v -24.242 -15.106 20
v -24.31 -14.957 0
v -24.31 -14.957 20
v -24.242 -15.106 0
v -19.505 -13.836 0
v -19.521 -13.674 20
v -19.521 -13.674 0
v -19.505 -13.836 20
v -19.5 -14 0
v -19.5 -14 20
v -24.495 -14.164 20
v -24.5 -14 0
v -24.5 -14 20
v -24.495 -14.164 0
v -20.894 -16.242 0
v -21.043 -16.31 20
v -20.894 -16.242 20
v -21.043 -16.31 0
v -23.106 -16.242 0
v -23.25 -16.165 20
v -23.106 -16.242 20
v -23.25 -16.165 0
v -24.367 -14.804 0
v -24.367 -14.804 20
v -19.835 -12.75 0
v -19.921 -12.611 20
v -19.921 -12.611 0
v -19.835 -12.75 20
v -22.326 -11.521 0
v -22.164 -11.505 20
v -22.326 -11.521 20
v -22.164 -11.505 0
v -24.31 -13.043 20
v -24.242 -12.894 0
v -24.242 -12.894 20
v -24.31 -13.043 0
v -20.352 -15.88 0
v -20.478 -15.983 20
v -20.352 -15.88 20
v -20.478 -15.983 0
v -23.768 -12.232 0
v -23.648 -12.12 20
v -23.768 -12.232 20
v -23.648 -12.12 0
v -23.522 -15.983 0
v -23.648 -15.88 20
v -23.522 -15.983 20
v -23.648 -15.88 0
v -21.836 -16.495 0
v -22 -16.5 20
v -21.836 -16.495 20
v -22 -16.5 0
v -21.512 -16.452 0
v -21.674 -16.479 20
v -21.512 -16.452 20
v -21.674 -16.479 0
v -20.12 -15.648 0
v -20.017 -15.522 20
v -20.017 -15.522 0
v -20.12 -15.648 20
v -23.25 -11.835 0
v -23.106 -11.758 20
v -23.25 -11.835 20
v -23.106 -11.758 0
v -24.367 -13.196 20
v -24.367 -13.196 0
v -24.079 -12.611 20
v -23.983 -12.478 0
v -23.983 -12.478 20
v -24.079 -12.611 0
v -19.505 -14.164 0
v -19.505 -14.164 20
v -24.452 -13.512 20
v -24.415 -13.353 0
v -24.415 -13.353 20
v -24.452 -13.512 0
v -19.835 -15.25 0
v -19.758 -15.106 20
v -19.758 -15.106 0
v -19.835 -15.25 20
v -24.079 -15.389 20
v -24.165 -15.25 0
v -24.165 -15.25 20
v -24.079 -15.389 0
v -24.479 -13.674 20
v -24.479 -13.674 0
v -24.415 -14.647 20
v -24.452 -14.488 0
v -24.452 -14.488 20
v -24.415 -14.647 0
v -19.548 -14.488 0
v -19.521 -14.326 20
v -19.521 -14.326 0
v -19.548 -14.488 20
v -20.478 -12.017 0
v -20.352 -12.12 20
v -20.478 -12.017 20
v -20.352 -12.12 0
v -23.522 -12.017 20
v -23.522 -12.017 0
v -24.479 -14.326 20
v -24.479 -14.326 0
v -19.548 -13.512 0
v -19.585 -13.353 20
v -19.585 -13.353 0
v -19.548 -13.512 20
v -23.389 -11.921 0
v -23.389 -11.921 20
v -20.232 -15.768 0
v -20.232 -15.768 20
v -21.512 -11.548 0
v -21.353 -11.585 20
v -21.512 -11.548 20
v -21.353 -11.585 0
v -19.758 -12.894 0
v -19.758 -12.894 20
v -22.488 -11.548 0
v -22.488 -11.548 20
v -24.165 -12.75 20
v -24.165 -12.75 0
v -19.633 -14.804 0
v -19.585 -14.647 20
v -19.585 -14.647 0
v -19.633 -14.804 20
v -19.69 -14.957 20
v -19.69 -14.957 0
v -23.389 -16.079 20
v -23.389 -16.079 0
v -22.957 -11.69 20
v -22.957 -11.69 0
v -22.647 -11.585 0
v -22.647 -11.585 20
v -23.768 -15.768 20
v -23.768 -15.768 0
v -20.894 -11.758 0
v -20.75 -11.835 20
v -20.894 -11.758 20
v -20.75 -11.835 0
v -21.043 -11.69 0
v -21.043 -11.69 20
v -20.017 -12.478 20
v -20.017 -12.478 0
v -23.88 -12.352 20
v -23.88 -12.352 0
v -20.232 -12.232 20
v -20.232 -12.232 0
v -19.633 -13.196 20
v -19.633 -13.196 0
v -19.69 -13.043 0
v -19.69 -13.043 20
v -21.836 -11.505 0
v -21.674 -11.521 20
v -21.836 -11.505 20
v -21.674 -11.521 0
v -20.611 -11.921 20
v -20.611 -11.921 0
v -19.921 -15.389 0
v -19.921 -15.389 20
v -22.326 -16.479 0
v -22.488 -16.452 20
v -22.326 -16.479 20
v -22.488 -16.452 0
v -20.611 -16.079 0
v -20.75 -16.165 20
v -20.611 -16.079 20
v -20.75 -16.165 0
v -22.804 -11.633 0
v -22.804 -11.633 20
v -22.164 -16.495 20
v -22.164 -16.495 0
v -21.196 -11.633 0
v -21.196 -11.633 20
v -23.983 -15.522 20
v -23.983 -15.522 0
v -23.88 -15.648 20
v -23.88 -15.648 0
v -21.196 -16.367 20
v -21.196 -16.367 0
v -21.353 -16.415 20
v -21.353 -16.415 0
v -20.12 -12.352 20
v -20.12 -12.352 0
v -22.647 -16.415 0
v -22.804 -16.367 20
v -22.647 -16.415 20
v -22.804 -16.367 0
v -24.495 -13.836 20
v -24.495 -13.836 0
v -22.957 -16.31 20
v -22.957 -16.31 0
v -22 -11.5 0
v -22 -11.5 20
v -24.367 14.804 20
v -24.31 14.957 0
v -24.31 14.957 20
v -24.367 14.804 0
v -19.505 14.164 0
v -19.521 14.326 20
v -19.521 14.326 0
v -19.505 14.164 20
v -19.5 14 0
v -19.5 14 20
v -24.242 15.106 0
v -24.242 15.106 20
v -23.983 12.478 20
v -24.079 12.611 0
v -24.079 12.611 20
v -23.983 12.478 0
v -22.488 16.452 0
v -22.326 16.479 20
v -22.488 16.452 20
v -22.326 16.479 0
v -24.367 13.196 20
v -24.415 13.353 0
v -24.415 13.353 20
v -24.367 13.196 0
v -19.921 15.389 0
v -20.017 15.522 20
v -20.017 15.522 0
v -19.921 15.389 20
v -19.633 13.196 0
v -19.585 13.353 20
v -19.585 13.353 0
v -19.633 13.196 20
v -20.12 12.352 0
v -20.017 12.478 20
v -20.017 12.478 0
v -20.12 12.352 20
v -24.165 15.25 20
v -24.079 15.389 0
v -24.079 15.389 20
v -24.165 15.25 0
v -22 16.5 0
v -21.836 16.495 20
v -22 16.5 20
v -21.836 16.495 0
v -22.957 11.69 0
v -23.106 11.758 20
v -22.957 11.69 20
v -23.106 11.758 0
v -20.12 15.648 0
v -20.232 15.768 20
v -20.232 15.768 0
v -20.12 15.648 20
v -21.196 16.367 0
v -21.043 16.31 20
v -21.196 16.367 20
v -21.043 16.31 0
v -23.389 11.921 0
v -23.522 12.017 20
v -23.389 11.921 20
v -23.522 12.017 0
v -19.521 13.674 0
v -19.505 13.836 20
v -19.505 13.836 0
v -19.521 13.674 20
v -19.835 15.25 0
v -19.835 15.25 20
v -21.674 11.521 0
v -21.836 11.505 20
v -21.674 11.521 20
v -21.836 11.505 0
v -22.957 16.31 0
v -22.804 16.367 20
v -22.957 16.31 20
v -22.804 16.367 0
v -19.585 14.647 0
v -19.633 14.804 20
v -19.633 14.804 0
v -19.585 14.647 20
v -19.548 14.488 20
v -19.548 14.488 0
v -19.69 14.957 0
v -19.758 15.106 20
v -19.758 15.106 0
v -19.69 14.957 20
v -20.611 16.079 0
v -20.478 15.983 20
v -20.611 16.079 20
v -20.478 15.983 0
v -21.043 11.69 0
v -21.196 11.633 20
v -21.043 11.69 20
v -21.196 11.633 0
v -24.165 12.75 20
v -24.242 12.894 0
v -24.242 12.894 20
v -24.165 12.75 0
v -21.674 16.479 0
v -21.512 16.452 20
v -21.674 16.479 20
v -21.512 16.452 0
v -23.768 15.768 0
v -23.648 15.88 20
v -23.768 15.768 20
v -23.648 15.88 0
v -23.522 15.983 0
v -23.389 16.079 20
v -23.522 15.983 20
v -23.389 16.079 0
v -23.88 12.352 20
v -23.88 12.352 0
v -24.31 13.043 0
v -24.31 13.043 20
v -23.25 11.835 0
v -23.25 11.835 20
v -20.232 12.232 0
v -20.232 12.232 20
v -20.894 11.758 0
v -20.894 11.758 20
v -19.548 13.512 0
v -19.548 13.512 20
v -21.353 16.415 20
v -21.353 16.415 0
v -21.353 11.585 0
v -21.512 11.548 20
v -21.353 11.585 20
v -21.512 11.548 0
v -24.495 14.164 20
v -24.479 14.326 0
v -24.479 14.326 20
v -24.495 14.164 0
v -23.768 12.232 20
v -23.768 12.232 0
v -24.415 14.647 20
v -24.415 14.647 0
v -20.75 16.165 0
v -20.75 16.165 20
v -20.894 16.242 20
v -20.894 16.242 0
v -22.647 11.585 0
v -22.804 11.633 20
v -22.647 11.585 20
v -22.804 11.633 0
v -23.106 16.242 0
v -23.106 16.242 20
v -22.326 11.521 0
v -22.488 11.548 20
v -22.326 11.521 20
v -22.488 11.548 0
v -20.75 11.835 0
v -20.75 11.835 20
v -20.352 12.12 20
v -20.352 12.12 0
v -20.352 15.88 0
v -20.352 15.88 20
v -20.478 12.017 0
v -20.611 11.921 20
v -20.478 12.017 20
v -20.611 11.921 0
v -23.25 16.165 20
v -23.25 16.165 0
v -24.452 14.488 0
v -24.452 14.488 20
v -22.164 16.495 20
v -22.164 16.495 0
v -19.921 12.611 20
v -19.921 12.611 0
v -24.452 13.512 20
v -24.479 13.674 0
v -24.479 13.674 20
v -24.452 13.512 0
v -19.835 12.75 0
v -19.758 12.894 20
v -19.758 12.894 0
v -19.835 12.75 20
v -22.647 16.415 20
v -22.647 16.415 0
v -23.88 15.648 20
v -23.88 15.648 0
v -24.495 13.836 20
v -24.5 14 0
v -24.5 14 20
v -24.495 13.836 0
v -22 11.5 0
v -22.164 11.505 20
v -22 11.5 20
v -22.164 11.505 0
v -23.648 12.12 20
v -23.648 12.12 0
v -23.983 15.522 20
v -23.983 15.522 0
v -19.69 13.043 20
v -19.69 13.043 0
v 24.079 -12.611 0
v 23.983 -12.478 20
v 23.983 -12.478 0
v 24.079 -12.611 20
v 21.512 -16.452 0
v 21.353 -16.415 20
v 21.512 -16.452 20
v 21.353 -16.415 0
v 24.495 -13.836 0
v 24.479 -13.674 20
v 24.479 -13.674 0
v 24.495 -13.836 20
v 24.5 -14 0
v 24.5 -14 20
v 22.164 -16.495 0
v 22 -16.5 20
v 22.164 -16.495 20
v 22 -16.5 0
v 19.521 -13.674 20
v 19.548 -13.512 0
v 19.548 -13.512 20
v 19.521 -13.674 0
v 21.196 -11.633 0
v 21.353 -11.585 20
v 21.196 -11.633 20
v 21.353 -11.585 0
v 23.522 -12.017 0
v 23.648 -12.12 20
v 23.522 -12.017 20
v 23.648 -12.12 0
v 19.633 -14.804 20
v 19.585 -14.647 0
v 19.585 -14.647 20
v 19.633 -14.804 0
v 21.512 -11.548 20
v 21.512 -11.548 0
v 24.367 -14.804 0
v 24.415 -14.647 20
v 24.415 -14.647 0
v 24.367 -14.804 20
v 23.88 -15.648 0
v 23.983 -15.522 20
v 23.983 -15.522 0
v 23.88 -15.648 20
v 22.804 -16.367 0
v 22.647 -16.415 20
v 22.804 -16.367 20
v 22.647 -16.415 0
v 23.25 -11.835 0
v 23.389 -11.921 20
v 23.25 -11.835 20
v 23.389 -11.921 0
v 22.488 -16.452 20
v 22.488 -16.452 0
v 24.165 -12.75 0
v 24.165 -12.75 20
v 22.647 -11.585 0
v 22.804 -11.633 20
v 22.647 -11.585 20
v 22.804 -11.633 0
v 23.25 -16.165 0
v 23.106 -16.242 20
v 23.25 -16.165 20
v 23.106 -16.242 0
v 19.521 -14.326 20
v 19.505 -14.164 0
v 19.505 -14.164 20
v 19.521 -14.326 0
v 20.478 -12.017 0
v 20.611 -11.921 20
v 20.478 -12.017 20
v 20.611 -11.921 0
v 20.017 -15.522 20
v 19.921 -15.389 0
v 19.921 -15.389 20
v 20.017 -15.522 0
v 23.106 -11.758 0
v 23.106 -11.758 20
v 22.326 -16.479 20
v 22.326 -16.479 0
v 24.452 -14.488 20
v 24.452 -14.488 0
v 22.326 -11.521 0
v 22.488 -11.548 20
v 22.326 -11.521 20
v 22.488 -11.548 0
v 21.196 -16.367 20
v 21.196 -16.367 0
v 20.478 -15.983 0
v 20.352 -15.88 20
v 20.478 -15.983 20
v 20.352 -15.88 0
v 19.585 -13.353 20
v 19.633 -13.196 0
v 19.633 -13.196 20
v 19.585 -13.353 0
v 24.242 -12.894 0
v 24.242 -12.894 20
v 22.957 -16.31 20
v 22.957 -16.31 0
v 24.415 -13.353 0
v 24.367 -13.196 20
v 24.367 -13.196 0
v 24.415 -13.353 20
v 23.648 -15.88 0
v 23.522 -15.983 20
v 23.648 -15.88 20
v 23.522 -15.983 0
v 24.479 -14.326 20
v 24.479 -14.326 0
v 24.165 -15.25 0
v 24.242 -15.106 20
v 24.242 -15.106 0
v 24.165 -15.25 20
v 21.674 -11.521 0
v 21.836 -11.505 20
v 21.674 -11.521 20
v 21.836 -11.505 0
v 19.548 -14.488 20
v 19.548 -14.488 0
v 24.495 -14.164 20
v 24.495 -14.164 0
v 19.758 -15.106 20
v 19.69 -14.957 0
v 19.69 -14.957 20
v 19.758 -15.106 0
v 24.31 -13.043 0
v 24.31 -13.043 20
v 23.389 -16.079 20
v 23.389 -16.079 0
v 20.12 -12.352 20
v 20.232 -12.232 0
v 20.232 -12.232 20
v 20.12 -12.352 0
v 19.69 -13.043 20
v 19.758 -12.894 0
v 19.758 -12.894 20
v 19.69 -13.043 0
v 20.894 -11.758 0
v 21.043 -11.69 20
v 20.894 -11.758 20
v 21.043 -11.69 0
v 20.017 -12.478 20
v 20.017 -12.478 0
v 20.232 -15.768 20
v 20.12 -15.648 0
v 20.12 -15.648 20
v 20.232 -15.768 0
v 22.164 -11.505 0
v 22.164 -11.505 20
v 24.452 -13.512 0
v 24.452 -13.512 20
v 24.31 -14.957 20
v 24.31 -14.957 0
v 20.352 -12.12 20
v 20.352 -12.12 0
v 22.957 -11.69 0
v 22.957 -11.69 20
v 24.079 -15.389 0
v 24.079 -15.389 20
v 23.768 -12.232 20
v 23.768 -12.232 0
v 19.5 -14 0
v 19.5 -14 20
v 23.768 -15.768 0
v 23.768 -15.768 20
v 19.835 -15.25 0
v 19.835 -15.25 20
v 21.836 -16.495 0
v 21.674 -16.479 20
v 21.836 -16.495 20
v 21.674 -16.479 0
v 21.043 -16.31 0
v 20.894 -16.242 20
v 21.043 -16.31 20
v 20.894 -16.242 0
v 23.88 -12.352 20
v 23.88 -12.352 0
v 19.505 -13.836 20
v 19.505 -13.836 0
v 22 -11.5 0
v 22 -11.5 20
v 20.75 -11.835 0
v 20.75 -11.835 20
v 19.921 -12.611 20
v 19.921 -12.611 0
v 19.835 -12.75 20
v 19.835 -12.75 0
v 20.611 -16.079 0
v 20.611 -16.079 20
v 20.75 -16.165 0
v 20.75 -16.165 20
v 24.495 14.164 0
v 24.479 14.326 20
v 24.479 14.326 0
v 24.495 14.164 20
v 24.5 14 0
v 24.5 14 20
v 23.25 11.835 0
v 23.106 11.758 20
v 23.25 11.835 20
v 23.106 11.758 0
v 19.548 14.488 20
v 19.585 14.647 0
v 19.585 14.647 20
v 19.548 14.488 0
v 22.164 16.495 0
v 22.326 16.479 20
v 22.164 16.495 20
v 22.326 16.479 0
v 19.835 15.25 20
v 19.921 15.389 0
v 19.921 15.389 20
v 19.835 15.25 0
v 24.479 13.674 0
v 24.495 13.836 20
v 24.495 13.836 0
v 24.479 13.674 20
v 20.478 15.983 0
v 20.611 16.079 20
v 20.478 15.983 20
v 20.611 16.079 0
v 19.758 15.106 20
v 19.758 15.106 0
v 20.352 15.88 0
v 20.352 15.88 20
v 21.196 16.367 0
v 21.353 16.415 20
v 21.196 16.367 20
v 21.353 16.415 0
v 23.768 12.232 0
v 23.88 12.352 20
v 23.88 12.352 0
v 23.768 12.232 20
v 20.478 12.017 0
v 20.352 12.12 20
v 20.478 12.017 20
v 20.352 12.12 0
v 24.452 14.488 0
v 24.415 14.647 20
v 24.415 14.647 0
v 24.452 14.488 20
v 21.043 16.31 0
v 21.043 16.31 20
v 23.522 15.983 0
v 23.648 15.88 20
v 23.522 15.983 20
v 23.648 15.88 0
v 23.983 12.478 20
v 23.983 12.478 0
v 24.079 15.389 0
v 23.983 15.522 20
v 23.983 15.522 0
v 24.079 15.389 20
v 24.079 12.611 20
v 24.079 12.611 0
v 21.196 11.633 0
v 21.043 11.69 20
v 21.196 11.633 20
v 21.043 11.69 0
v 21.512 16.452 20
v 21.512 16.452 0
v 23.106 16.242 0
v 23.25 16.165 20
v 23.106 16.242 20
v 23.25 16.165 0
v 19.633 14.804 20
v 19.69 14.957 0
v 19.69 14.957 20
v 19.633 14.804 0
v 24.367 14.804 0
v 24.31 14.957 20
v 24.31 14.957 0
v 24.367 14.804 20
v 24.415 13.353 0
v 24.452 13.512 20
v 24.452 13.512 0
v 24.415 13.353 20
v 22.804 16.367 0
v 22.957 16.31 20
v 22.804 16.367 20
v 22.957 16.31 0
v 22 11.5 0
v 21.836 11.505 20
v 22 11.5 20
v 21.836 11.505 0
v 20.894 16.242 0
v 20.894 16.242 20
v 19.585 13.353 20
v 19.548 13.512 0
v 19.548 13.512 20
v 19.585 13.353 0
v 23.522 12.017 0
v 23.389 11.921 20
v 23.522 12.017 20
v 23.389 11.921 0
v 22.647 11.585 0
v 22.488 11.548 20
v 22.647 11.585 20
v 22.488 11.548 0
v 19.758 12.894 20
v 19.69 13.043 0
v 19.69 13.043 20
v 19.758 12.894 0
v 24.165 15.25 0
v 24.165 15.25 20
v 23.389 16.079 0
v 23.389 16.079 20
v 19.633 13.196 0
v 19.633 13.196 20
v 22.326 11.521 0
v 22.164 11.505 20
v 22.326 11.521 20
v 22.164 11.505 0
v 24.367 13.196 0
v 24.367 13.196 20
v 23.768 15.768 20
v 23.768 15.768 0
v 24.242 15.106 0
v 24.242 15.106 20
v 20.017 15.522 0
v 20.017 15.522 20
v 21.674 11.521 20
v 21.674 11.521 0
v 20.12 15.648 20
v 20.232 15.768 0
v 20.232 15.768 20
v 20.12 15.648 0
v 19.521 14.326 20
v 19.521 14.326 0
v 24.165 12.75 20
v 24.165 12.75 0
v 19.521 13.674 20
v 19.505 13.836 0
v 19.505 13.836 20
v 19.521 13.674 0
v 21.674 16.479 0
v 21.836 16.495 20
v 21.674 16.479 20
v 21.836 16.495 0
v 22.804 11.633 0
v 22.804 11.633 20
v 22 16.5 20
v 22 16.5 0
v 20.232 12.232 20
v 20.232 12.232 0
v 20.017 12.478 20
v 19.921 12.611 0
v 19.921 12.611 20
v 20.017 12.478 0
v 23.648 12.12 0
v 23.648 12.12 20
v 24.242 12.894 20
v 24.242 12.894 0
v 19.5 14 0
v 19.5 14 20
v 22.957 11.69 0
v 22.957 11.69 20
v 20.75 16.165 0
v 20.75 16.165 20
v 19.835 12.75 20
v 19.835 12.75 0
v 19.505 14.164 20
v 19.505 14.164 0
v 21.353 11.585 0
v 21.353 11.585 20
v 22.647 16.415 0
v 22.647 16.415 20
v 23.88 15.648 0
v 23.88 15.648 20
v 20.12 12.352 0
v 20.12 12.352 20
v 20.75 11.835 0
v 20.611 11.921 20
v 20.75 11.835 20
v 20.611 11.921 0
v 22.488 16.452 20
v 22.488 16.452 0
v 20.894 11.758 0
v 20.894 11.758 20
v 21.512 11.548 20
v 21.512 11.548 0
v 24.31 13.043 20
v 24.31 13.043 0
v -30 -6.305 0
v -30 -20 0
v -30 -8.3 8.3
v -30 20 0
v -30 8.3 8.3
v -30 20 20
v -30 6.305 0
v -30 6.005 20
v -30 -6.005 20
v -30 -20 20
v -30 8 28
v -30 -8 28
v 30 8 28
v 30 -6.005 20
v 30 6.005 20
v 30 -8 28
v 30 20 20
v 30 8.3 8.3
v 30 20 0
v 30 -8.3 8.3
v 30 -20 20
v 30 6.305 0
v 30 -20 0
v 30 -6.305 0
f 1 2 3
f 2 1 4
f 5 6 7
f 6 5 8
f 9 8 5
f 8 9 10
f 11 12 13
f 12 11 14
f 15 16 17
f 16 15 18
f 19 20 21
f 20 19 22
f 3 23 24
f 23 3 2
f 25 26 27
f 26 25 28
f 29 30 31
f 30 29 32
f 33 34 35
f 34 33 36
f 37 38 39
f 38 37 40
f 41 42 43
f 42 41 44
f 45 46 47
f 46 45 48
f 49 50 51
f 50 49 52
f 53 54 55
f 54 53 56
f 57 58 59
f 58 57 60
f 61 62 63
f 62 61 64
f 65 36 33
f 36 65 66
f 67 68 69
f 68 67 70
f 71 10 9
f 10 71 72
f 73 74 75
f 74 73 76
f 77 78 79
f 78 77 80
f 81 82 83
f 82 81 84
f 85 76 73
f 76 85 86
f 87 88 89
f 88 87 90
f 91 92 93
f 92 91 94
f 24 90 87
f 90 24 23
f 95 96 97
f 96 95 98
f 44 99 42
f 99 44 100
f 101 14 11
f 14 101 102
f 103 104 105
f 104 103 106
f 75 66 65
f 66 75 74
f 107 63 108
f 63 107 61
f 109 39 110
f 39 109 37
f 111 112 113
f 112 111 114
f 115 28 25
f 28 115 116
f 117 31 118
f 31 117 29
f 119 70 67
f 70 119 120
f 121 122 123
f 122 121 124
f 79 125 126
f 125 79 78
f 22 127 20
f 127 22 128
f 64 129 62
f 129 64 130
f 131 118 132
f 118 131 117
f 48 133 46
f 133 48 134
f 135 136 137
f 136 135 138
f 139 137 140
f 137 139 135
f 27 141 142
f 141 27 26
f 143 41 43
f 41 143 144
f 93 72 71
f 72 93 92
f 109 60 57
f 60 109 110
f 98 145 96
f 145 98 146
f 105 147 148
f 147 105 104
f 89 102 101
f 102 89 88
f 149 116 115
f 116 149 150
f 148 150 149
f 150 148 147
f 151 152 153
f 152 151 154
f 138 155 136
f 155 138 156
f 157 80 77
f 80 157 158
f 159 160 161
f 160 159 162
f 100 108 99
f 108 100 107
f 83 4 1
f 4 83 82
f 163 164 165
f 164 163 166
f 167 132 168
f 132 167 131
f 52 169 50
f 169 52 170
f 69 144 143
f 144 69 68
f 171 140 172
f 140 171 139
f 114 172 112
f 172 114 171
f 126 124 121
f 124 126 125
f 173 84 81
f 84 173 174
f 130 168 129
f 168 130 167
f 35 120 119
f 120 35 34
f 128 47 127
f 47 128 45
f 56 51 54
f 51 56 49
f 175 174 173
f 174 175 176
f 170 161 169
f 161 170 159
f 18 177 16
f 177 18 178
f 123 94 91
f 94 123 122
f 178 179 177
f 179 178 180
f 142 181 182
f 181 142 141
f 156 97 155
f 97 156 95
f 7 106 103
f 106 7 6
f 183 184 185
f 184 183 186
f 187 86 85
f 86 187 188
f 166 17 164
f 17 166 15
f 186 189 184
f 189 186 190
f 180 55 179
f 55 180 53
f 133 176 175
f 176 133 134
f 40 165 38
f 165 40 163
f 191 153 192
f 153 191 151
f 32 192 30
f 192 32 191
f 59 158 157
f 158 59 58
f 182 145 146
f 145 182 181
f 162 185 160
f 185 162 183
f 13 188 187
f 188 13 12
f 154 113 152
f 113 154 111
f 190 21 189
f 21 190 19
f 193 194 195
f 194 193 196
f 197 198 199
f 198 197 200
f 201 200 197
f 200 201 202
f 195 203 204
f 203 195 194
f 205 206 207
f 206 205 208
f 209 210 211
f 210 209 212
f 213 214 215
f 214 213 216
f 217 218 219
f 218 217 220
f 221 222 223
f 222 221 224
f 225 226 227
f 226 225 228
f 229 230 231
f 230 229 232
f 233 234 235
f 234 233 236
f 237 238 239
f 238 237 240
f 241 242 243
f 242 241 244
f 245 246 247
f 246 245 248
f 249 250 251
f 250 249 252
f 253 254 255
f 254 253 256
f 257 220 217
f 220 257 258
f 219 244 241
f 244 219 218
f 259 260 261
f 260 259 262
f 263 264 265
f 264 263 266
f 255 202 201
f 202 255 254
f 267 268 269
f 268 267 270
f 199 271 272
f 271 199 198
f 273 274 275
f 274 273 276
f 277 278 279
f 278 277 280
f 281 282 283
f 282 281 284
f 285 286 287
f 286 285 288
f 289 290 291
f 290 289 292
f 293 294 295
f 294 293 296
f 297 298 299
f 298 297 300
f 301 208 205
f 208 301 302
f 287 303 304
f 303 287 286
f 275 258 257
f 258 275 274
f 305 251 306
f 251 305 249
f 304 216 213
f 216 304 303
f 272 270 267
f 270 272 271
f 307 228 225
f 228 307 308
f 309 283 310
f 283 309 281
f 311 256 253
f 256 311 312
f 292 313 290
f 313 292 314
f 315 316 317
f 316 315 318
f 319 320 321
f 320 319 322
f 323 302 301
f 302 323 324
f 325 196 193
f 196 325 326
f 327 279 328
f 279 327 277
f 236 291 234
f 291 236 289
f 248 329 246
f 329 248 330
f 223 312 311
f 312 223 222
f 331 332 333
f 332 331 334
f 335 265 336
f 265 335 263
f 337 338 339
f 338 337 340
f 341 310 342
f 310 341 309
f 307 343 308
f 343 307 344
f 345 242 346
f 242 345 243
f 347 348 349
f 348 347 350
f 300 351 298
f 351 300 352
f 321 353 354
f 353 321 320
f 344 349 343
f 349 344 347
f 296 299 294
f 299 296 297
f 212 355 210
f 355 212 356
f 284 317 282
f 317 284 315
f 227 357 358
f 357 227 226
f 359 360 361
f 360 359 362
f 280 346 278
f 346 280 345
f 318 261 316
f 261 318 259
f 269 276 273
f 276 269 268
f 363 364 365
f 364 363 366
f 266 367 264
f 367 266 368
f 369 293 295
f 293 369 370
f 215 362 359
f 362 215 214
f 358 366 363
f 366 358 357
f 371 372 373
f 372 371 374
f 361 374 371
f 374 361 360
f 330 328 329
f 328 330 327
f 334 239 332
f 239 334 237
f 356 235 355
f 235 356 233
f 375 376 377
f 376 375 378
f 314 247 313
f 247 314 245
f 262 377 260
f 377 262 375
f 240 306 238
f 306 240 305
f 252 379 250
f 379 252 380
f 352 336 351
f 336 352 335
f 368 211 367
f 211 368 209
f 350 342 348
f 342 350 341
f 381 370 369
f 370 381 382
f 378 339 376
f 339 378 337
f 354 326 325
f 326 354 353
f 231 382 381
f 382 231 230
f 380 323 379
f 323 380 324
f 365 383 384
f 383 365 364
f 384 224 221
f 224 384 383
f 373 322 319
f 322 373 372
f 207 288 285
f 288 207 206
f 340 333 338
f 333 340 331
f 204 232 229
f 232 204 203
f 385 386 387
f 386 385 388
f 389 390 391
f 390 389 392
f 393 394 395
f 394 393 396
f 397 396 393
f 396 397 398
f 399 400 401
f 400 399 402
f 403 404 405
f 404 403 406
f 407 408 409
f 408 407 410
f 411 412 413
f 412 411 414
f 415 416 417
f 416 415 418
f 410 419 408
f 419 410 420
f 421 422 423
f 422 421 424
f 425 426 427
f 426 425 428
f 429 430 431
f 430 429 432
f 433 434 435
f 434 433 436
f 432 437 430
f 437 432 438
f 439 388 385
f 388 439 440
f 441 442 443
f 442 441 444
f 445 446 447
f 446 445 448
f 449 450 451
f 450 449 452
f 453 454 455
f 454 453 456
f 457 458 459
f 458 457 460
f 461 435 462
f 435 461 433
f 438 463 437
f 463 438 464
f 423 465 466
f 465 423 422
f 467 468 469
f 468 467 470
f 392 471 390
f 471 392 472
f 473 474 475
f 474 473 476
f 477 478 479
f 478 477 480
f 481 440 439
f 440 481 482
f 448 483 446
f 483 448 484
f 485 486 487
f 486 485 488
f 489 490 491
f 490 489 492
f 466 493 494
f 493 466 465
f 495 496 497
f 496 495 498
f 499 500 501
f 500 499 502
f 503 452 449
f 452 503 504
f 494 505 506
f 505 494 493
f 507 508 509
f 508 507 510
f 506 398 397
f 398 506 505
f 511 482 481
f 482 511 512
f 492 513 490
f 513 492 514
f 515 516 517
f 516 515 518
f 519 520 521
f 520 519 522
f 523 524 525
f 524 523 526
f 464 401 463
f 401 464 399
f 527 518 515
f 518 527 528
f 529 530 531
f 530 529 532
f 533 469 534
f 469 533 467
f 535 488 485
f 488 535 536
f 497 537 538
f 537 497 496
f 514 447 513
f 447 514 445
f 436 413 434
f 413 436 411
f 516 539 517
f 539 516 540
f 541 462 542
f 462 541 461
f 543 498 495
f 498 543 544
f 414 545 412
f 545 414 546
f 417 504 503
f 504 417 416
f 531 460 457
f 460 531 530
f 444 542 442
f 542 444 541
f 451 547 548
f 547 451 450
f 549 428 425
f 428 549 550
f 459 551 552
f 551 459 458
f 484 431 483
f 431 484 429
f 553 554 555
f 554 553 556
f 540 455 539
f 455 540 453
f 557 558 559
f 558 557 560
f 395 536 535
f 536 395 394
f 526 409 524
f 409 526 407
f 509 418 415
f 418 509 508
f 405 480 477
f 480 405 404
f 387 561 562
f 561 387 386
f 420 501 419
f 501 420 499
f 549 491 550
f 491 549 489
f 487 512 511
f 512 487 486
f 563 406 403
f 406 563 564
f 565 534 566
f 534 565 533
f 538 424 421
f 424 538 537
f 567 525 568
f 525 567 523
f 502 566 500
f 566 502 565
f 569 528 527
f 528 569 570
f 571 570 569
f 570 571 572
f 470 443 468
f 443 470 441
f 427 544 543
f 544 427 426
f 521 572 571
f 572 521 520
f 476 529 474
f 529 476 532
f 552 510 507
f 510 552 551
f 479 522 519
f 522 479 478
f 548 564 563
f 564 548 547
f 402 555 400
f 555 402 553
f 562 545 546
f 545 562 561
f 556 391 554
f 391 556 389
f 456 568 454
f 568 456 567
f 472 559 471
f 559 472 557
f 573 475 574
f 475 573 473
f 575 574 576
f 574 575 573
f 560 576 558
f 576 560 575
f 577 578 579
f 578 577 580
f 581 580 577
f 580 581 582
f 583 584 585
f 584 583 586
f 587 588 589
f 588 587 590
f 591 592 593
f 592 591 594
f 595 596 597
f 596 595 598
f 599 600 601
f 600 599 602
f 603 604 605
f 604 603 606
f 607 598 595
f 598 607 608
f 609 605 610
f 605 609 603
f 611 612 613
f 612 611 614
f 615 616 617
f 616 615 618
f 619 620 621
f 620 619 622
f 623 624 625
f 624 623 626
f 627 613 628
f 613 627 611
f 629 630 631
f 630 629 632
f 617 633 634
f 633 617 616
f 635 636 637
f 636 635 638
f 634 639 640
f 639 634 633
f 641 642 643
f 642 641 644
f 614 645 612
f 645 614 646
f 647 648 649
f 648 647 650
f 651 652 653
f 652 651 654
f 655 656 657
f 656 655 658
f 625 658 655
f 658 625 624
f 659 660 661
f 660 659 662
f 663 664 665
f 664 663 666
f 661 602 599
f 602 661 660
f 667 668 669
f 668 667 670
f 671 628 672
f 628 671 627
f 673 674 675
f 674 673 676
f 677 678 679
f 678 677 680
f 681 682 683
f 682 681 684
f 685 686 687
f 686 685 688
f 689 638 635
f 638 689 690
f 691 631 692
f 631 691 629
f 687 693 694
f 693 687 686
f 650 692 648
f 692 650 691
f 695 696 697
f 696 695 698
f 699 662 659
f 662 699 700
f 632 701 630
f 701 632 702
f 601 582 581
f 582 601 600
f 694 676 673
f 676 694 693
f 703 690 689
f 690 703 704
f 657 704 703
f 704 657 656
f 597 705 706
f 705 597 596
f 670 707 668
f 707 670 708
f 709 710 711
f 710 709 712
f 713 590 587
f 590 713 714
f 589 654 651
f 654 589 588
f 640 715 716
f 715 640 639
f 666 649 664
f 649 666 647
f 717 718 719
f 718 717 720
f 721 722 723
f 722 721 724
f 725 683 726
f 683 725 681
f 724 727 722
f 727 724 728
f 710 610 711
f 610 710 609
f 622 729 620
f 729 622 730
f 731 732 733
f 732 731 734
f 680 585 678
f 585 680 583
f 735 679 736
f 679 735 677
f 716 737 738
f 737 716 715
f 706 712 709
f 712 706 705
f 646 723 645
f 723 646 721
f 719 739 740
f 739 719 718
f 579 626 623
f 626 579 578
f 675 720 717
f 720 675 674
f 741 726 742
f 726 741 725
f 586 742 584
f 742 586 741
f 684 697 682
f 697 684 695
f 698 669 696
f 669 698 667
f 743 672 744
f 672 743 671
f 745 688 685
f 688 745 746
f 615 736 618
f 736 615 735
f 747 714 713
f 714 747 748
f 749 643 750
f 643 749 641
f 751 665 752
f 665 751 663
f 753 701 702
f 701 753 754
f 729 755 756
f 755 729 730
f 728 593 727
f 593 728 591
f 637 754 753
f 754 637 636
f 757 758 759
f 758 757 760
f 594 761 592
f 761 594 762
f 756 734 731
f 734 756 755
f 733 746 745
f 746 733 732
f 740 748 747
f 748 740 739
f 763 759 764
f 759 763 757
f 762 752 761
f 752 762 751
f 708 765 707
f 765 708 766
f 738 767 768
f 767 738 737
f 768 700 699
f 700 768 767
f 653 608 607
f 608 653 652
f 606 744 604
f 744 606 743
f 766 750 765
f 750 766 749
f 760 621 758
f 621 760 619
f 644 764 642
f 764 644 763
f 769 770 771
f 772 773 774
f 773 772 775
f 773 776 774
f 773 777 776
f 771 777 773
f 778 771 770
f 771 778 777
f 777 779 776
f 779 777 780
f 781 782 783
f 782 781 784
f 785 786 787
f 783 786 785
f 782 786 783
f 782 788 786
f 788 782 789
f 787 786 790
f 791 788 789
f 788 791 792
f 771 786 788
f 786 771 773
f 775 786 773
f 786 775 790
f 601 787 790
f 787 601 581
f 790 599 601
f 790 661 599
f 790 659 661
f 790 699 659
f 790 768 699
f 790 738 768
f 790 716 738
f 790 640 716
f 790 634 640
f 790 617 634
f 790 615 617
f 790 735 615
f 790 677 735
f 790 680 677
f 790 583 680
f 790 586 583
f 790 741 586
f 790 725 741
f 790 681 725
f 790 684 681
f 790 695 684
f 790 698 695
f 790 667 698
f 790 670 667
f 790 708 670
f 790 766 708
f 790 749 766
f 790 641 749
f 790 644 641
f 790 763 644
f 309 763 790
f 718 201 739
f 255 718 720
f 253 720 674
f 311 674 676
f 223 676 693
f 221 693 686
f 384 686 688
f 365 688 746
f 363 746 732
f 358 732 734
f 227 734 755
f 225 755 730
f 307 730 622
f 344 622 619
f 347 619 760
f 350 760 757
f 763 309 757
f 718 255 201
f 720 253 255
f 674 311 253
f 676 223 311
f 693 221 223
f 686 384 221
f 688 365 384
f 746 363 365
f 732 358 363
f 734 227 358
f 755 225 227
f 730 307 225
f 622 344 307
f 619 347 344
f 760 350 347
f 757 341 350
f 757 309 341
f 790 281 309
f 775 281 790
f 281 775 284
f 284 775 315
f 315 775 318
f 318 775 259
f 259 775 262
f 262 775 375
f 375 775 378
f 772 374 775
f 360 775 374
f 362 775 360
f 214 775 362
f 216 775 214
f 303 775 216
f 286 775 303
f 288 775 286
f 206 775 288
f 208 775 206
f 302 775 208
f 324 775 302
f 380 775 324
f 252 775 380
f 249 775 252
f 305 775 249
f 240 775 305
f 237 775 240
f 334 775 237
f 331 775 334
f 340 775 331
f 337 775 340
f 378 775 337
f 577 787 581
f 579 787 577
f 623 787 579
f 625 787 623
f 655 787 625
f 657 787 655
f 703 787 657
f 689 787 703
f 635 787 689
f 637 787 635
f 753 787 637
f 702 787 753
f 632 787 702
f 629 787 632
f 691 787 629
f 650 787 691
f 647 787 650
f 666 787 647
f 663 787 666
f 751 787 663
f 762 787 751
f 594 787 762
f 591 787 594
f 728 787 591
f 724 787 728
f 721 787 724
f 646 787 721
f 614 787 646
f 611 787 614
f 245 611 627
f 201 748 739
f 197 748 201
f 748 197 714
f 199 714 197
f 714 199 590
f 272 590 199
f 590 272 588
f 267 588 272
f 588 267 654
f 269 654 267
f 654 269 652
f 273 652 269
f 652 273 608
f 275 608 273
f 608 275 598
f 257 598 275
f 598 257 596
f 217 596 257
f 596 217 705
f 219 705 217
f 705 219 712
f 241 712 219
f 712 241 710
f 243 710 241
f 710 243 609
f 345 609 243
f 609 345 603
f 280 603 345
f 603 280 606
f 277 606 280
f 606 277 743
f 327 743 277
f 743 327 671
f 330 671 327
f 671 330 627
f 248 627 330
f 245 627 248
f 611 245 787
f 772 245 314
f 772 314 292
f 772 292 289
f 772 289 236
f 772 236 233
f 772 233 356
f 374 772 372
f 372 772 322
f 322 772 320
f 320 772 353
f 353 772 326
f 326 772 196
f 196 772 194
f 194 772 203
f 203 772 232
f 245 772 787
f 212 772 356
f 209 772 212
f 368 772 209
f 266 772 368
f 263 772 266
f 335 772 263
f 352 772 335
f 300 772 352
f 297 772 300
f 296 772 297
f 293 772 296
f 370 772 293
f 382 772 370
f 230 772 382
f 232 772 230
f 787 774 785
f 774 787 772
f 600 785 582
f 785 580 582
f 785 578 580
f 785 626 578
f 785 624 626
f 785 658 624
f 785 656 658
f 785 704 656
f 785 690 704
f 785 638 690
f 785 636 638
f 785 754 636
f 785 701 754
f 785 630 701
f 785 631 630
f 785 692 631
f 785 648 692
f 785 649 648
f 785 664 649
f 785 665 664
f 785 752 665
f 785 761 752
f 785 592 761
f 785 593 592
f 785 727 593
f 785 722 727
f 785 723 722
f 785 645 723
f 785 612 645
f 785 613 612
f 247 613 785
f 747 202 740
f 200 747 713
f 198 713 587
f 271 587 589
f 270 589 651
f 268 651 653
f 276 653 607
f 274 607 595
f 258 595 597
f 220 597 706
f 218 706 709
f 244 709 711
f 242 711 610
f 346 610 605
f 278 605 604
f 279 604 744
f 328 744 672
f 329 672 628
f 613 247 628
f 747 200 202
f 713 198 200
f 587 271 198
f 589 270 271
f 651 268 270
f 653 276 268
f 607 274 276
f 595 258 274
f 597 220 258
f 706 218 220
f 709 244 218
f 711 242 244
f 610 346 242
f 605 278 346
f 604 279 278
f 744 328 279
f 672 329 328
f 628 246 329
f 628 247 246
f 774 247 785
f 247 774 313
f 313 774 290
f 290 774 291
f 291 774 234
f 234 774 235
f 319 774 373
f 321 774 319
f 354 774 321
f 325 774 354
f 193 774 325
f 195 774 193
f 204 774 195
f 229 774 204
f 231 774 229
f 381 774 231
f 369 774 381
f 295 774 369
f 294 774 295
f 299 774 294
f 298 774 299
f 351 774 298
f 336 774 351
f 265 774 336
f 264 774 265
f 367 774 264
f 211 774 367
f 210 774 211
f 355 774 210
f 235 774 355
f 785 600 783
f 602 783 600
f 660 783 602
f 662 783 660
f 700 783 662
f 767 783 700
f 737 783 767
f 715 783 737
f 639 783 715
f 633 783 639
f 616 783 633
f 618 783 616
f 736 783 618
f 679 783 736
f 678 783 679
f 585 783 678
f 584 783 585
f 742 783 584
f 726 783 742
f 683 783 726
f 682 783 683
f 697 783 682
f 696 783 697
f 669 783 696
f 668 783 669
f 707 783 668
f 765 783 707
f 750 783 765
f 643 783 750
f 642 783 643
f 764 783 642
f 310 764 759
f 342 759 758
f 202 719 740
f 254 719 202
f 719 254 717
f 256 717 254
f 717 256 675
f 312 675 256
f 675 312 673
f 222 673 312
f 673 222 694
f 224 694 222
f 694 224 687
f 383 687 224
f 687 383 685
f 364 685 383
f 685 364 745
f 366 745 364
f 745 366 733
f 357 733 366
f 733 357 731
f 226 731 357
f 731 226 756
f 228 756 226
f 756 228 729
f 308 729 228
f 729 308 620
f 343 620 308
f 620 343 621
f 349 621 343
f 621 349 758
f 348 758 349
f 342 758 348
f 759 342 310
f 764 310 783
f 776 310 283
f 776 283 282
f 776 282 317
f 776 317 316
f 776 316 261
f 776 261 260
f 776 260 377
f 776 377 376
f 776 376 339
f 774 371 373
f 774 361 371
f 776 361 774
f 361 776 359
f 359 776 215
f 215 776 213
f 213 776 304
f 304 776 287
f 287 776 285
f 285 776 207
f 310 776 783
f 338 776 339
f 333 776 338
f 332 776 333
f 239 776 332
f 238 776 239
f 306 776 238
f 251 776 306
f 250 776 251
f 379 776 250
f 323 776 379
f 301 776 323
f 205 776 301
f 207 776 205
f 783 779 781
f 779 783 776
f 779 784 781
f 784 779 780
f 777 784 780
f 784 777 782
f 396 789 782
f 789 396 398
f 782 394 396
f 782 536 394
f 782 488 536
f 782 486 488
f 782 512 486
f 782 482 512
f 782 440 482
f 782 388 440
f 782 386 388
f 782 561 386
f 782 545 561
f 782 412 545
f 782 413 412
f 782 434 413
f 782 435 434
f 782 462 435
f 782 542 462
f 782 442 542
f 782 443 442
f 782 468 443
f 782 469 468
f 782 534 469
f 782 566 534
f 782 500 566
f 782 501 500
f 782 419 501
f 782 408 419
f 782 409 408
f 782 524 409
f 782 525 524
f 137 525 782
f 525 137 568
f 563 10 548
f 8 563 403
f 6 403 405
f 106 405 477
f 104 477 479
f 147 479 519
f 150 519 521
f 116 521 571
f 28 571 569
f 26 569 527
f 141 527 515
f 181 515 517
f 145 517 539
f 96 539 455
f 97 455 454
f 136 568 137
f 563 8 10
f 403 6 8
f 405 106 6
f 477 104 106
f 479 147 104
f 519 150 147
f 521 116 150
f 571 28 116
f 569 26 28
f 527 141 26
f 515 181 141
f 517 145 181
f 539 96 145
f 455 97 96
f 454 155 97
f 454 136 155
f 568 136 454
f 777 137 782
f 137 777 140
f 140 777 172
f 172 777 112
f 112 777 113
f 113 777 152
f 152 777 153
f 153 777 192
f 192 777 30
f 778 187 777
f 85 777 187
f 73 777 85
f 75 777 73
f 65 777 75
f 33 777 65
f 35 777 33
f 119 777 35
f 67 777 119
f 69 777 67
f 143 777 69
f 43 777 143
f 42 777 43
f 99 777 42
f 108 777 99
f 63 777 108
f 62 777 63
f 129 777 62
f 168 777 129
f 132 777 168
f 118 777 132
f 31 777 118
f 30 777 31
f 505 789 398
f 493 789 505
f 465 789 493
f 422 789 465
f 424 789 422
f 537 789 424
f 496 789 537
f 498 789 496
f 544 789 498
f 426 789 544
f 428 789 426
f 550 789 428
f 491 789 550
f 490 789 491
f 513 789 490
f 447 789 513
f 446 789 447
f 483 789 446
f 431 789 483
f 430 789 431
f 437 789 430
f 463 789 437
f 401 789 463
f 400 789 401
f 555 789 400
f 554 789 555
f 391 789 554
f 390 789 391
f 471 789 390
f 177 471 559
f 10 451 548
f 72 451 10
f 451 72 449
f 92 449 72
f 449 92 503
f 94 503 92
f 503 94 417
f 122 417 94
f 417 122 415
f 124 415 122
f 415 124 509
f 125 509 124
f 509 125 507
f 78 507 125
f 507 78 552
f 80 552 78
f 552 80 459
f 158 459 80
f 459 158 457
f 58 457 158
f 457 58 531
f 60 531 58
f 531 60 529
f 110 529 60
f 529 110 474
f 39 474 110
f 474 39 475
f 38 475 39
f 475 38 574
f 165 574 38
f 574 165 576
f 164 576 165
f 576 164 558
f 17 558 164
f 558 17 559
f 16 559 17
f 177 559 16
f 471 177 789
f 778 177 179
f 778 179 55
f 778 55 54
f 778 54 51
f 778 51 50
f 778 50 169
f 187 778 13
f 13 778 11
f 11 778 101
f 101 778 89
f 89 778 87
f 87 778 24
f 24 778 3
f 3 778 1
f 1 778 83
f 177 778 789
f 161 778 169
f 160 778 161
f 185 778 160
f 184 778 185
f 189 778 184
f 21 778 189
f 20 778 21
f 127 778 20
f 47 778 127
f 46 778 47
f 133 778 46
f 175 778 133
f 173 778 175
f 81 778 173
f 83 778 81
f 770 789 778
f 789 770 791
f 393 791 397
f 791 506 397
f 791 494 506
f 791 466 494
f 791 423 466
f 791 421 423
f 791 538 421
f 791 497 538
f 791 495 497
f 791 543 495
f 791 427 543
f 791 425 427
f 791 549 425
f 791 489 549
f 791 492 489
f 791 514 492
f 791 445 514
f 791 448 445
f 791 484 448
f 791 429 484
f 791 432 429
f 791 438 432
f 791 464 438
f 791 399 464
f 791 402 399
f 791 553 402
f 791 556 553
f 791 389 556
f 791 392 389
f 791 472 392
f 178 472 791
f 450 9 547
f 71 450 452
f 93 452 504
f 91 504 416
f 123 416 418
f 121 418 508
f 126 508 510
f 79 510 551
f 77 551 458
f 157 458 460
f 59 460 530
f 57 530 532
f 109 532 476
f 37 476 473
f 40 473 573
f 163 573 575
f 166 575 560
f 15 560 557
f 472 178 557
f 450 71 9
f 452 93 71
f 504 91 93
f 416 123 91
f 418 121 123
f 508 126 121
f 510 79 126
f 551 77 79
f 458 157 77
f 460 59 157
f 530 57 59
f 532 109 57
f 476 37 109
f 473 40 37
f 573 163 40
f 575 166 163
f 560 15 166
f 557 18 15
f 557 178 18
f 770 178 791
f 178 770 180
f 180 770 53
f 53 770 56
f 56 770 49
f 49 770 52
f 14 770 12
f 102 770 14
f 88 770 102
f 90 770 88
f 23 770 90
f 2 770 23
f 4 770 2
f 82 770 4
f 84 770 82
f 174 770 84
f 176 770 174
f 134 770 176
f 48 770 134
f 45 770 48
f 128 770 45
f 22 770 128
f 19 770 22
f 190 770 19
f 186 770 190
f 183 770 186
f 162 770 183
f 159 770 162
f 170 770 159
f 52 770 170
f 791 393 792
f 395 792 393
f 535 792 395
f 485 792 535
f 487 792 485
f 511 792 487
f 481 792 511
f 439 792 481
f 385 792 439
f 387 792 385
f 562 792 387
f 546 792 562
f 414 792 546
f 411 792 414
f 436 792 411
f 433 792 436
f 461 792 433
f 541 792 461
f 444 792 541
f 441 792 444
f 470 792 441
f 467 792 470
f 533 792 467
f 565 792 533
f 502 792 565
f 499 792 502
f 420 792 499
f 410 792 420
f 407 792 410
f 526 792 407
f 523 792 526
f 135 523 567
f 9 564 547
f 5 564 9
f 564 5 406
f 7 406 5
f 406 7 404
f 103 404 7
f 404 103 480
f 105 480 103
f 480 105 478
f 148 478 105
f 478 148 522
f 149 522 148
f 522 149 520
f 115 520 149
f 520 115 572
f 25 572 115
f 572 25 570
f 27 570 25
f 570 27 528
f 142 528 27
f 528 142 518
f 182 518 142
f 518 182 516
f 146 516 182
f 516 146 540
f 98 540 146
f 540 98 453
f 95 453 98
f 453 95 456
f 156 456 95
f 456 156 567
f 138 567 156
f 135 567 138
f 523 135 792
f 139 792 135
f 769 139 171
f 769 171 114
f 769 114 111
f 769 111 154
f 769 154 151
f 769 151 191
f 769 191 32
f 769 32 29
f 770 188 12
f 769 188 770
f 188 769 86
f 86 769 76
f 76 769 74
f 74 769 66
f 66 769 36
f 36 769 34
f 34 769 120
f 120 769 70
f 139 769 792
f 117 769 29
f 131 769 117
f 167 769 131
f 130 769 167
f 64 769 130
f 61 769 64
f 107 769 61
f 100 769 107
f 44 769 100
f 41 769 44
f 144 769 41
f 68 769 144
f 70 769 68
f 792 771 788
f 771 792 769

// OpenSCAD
// t4-009 stacking dovetail block
dovetail_width = 16;   // rail top width
dovetail_height = 8;
slide_clearance = 0.3;
block = [60, 40, 20];
rail_base = dovetail_width - 2 * dovetail_height * tan(14);  // 12 mm
$fn = 96;

c = slide_clearance;
H = block.z;
W = block.y / 2;
sb = rail_base / 2 + c;        // socket half-width at opening (6.3)
st = dovetail_width / 2 + c;   // socket half-width at deepest (8.3)
sd = dovetail_height + c;
rb = rail_base / 2;
rt = dovetail_width / 2;
difference() {
    // YZ profile (block - socket + rail) extruded along X
    rotate([90, 0, 90]) linear_extrude(height = block.x, center = true)
        polygon([[-W, 0], [-sb, 0], [-st, sd], [st, sd], [sb, 0], [W, 0],
                 [W, H], [rb, H], [rt, H + dovetail_height],
                 [-rt, H + dovetail_height], [-rb, H], [-W, H]]);
    for (x = [-22, 22], y = [-14, 14]) translate([x, y, -1]) cylinder(d = 5, h = H + 2);
}
